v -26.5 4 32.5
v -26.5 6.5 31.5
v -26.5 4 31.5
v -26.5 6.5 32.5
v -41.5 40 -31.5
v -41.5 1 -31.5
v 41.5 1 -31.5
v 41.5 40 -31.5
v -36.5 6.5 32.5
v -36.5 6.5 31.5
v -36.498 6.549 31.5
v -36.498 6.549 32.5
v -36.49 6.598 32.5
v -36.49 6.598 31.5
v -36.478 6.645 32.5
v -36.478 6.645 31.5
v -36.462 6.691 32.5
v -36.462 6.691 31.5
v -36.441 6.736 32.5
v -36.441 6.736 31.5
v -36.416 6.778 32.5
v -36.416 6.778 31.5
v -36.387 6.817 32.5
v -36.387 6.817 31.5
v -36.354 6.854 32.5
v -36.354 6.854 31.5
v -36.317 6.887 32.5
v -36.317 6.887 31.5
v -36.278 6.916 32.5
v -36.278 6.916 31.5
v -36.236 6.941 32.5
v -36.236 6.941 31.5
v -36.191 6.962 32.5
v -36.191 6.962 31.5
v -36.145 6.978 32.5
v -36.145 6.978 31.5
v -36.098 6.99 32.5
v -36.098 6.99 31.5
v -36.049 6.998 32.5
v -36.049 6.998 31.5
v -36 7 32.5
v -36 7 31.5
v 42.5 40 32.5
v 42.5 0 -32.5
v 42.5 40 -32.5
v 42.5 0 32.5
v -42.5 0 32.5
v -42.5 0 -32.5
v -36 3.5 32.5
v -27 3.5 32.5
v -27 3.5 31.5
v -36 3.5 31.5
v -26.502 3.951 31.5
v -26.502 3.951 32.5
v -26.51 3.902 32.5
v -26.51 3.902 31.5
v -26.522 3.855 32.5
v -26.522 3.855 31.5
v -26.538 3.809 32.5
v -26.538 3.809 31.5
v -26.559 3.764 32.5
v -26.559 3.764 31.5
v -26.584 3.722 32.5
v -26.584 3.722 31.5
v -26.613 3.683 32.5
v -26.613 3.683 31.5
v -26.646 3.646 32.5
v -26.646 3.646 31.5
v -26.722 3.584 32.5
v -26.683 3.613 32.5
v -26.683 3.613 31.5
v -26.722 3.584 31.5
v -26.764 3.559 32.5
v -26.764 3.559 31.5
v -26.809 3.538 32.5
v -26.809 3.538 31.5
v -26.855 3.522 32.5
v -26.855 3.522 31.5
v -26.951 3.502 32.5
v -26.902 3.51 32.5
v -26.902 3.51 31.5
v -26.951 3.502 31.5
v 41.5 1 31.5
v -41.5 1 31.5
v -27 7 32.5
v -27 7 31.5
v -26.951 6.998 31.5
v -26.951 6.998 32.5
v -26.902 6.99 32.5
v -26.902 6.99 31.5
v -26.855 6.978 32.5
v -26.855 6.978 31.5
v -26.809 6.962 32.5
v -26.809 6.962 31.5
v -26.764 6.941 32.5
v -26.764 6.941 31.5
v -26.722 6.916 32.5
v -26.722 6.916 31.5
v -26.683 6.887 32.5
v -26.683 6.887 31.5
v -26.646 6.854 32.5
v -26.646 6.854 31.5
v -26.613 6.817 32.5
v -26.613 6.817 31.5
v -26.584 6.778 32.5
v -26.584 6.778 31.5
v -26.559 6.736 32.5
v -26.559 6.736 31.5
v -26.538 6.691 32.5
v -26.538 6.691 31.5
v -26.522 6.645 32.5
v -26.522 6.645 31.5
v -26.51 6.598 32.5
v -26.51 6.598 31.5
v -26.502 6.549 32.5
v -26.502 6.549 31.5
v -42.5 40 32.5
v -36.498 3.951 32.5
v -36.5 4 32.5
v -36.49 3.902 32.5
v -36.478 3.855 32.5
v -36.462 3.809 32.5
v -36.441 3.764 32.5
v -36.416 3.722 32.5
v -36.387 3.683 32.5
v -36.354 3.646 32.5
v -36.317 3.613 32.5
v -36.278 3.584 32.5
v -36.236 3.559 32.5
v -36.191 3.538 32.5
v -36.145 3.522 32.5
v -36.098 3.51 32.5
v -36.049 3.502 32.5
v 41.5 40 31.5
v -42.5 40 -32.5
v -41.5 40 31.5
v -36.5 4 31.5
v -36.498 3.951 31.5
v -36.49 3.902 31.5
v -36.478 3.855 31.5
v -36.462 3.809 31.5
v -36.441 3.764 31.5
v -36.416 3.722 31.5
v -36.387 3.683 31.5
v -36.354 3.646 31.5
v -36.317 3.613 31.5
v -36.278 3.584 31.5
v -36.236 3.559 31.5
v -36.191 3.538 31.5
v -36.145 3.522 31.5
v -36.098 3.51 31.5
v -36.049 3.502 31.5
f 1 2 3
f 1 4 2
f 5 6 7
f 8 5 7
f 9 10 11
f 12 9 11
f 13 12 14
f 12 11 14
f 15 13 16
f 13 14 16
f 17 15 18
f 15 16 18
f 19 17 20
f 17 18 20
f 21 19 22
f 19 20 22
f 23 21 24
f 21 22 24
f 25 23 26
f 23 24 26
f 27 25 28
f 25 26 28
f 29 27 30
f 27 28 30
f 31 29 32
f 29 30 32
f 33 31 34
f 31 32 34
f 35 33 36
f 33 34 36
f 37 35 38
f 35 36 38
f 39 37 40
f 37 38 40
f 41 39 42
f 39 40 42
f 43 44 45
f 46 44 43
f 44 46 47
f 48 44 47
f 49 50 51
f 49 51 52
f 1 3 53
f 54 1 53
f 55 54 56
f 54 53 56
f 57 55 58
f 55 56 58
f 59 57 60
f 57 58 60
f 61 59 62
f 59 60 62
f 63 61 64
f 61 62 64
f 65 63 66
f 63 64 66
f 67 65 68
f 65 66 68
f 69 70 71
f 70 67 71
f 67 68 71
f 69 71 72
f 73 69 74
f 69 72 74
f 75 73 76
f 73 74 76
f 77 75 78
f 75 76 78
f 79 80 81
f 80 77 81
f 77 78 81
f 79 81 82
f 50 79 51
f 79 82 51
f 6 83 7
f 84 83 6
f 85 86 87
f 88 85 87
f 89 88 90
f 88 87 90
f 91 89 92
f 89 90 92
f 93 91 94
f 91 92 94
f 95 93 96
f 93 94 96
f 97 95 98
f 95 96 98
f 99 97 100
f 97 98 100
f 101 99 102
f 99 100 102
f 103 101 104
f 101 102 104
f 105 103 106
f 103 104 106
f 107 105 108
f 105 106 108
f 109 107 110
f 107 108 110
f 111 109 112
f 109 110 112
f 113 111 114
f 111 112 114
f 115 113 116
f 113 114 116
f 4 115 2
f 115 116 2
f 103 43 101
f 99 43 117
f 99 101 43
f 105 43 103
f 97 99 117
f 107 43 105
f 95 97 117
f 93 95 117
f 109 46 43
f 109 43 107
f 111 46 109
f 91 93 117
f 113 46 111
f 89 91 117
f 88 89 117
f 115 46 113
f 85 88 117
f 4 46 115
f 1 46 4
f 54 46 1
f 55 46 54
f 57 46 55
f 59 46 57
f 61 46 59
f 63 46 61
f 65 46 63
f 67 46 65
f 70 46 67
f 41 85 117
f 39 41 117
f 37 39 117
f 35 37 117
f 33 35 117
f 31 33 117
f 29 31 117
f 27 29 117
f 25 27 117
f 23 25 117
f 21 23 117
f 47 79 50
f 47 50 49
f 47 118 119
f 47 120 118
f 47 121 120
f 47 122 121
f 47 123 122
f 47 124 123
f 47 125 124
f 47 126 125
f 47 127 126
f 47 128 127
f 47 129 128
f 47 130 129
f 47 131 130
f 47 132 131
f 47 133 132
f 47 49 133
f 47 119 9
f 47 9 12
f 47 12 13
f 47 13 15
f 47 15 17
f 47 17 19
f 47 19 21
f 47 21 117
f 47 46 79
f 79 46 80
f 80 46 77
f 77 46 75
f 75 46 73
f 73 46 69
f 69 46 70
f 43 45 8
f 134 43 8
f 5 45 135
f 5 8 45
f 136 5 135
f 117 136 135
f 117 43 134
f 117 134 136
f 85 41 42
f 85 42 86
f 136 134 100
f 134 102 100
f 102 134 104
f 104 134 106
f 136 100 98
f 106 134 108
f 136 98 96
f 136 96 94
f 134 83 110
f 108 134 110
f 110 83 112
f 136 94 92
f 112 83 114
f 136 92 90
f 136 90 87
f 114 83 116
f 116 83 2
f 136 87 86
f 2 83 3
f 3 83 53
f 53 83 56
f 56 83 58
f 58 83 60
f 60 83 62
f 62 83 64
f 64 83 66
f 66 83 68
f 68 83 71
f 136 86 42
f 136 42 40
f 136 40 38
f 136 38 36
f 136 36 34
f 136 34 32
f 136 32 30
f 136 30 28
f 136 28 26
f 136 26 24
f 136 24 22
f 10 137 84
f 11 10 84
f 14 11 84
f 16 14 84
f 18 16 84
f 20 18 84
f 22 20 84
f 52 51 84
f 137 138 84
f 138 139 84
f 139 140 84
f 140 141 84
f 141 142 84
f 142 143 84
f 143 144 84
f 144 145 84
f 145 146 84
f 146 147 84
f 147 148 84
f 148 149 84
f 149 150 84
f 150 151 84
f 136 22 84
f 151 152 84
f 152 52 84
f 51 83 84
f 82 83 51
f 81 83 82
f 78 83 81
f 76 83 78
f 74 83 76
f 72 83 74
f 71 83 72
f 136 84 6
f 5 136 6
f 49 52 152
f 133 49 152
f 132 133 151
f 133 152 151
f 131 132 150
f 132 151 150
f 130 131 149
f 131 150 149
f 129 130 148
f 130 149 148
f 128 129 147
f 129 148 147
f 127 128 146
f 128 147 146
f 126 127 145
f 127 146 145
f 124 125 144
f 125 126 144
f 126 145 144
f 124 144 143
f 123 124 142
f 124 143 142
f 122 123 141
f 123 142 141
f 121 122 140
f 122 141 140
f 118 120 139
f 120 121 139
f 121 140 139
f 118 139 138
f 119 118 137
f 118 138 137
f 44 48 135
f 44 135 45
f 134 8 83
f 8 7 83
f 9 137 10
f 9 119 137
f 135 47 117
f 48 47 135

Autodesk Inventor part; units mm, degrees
ref_plane "YZ Plane" through (0, 0, 0) normal (1, 0, 0) x (0, 1, 0)
ref_plane "XZ Plane" through (0, 0, 0) normal (0, 1, 0) x (-1, 0, 0)
ref_plane "XY Plane" through (0, 0, 0) normal (0, 0, 1) x (1, 0, 0)
sketch "Sketch1" plane through (0, 0, 0) normal (0, 1, 0) x (-1, 0, 0)
  line L0 (42.5, -32.5) -> (-42.5, -32.5)
  line L1 (-42.5, -32.5) -> (-42.5, 32.5)
  line L2 (-42.5, 32.5) -> (42.5, 32.5)
  line L3 (42.5, 32.5) -> (42.5, -32.5)
  point P0 (0, 0)
  point P1 (42.5, 0)
  point P2 (0, -32.5)
  dimension "d0" = 85
  dimension "d1" = 65
extrude "Extrusion1" add sketch "Sketch1" along normal blind 40
sketch "Sketch2" plane through (0, 40, 0) normal (0, 1, 0) x (1, 0, 0)
  point P0 (0, 0)
shell "Shell1" thickness 1 removed faces 1 at (14.1667, 40, 10.8333)
sketch "Sketch4" plane through (-42.5, 0, 32.5) normal (0, 0, 1) x (1, 0, 0)
  line L0 (6, 7) -> (16, 7)
  line L1 (16, 7) -> (16, 3.5)
  line L2 (16, 3.5) -> (6, 3.5)
  line L3 (6, 3.5) -> (6, 7)
  line L4 (0, 0) -> (0, 40) projected
  line L5 (0, 0) -> (85, 0) projected
  point P0 (42.5, 0)
  dimension "d7" = 10
  dimension "d8" = 3.5
  dimension "d9" = 6
  dimension "d10" = 3.5
extrude "Extrusion3" cut sketch "Sketch4" against normal blind 3
sketch "Sketch5" plane through (-42.5, 0, 32.5) normal (0, 0, 1) x (1, 0, 0)
  point P0 (42.5, 0)
fillet "Fillet1" radius 0.5 4 edges at (-26.5, 7, 32) (-36.5, 7, 32) (-26.5, 3.5, 32) (-36.5, 3.5, 32)
properties part number "timer and thermometer"
